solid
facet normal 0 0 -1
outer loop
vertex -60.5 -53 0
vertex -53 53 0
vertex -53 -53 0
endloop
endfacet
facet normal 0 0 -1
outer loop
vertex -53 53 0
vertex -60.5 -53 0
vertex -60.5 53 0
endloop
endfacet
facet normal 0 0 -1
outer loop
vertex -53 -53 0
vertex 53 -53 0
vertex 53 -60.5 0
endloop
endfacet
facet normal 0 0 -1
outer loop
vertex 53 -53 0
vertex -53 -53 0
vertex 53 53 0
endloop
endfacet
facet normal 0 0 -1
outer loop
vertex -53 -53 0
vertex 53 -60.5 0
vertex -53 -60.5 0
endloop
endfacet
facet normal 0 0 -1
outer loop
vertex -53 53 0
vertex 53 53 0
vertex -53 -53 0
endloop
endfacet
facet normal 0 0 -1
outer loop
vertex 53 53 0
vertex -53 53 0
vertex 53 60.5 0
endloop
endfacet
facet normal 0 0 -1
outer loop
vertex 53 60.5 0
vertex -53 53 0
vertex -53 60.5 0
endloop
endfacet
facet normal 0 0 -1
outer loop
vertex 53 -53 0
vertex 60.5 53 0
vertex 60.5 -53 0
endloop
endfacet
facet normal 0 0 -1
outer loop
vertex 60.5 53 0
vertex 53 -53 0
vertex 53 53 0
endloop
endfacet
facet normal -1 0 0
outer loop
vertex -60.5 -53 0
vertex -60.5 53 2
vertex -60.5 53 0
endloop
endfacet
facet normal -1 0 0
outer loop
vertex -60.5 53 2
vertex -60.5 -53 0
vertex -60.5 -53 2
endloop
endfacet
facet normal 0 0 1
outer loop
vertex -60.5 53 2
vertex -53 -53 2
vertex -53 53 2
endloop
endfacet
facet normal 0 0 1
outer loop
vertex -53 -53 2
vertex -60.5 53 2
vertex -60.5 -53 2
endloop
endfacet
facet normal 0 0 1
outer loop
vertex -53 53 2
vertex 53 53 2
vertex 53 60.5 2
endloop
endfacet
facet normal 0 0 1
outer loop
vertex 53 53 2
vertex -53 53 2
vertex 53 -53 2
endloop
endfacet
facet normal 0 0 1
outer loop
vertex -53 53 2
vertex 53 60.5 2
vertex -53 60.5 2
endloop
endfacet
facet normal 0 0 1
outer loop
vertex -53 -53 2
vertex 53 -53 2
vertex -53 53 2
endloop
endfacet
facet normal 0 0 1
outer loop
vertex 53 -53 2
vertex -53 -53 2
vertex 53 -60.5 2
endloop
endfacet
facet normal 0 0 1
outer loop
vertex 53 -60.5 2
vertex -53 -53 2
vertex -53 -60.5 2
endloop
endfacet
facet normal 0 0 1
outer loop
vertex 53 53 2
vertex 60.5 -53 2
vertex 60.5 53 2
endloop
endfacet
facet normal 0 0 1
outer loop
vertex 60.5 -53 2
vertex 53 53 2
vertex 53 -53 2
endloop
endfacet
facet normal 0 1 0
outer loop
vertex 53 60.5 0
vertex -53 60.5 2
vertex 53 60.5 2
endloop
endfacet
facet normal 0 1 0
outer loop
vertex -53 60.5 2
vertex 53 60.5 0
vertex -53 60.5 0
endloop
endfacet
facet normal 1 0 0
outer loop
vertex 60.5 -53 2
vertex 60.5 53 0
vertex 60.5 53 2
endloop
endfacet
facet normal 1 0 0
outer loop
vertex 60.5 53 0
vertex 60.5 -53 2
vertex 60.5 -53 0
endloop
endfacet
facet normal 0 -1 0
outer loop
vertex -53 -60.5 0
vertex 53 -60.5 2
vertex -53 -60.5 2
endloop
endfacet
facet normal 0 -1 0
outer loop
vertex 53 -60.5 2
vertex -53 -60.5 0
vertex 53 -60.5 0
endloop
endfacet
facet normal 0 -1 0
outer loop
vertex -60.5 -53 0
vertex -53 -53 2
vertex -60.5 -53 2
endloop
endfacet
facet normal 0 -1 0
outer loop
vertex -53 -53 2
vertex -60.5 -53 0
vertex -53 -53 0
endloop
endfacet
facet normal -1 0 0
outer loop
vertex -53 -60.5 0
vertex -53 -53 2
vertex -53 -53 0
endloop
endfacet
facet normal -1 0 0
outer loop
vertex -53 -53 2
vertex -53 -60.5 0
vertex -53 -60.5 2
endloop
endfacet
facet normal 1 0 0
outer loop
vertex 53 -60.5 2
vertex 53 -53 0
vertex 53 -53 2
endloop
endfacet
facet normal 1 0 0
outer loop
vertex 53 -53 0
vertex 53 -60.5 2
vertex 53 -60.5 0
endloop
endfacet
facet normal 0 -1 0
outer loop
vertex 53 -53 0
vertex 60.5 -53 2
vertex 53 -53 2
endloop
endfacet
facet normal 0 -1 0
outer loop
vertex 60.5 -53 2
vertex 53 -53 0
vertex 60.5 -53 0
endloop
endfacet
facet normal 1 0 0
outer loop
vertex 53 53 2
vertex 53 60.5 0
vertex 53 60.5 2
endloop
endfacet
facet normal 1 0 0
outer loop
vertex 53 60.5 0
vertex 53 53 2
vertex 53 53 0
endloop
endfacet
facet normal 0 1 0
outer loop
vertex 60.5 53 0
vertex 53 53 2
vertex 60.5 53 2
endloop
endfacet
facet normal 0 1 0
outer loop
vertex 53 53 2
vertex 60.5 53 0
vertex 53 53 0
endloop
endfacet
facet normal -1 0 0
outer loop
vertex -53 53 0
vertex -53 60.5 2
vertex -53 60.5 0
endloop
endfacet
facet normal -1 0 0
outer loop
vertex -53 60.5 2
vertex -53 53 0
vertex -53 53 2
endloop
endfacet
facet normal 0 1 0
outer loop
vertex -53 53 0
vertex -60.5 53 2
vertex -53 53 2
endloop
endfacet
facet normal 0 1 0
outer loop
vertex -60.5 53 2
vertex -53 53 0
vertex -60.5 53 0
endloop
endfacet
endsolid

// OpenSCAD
echo(version=version());

difference() {
color("red")
    translate([0, -0, 0])
        linear_extrude(height = 2)
            square([121, 121], center = true);
    translate([-60.5,-60.5,0])
        linear_extrude(height = 2)
            square([15,15], center = true);
    translate([60.5,-60.5,0])
        linear_extrude(height = 2)
            square([15,15], center = true);
    translate([60.5,60.5,0])
        linear_extrude(height = 2)
            square([15,15], center = true);
    translate([-60.5,60.5,0])
        linear_extrude(height = 2)
            square([15,15], center = true);
}
                
